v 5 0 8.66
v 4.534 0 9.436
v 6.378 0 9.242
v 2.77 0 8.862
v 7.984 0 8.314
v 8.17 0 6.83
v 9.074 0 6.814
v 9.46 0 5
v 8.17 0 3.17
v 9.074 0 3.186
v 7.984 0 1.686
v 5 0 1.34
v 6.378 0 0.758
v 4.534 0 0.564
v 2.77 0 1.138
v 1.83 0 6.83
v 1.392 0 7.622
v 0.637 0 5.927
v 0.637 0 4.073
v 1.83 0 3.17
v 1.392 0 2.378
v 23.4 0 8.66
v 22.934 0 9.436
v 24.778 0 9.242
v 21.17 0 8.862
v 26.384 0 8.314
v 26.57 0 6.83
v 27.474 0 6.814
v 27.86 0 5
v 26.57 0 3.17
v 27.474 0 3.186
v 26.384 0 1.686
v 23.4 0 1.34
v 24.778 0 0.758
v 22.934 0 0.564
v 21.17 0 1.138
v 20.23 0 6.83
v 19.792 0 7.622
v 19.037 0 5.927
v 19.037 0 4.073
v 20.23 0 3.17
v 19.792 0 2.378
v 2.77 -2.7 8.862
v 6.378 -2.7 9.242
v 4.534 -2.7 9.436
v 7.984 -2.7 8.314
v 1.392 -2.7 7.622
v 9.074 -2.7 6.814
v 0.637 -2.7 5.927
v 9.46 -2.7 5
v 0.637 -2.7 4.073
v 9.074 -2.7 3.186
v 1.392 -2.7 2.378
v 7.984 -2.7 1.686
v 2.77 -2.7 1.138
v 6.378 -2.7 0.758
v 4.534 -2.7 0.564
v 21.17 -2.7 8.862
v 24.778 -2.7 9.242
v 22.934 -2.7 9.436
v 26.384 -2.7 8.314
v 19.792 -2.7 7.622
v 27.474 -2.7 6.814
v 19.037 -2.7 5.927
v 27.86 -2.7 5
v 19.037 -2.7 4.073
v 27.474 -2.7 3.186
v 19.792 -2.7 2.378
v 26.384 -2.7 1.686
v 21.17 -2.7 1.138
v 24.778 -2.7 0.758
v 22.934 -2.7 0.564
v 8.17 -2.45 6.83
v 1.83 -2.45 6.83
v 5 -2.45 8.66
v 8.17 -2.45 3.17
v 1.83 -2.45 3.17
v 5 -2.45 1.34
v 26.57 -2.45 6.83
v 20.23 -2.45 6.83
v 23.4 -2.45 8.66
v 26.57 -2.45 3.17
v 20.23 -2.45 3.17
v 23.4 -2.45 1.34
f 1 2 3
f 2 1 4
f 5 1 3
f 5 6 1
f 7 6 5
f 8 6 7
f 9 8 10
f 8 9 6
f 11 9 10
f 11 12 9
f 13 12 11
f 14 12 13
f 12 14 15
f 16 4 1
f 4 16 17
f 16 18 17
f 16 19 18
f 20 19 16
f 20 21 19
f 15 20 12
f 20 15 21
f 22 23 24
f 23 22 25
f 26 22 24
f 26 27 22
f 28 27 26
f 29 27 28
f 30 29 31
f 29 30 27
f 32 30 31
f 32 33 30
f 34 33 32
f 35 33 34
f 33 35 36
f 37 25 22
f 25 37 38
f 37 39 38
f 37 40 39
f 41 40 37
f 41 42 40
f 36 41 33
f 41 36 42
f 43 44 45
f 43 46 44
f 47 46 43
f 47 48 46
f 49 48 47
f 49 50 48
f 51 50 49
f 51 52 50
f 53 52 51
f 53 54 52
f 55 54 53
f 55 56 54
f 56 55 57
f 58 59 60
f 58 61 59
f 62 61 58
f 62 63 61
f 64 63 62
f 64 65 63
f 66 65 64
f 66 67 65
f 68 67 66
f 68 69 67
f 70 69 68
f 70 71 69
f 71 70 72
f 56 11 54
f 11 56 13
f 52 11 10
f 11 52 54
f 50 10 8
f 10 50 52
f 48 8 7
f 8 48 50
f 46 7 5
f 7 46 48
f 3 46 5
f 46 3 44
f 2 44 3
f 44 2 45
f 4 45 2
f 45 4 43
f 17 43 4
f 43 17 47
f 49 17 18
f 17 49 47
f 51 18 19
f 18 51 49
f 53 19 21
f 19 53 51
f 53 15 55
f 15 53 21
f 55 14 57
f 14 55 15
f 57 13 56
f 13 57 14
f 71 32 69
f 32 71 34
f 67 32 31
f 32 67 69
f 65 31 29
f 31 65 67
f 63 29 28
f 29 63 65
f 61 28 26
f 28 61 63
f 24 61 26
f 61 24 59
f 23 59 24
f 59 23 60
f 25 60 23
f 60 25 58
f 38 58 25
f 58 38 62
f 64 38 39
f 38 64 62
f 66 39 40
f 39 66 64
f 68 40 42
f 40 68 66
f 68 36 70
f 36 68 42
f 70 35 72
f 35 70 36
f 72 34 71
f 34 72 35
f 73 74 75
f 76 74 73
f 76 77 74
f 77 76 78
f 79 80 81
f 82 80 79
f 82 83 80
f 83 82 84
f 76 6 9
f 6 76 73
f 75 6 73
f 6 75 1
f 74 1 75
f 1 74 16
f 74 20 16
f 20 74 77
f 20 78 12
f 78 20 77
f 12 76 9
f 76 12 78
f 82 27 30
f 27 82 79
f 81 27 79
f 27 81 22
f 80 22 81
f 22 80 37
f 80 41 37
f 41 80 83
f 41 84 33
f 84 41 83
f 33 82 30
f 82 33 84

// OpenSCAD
// Copyright (C) 2025 Arif K. Rafiq
// This program is free software: you can redistribute it and/or modify
// it under the terms of the GNU General Public License as published by
// the Free Software Foundation, either version 3 of the License, or
// (at your option) any later version.

// This program is distributed in the hope that it will be useful,
// but WITHOUT ANY WARRANTY; without even the implied warranty of
// MERCHANTABILITY or FITNESS FOR A PARTICULAR PURPOSE.  See the
// GNU General Public License for more details.

// You should have received a copy of the GNU General Public License
// along with this file.  If not, see <https://www.gnu.org/licenses/>,
// or write to: license@temperedoptimism.com



// Fixed in example3.scad
tFitGap = [0.16, 0.16, 0.16];   // New
tWallMin = [0.40, 0.40, 0.16];         
pHexSink = [3.5, 2.3];
vTerminal0 = [5.0, 5.0];
vTerminal1 = [23.4, 5.0];
fx0=2;    //convexity
tEps=0.01; // Fixing conflicting bodies

//28.32
// Rotate
rotate([90,0,0]){
  difference(){
    // hex pocket surround
    // Read about render(convexity)    
                               // Modified      
    linear_extrude(pHexSink.y+ tWallMin.y, convexity=fx0){  
                                                 // Modified
      translate(vTerminal0)  circle(pHexSink.x +(tWallMin.x *2) + tFitGap.x); //28:54
      translate(vTerminal1)  circle(pHexSink.x +(tWallMin.x *2) + tFitGap.x);
    }
    //hex pocket
    // Solve Conflicting bodies                       // Added tFitGap.y to 3 lines
    translate([0,0, -tEps]) linear_extrude(pHexSink.y + tFitGap.y, convexity=fx0){
      translate(vTerminal0)  rotate([0,0,30]) circle(pHexSink.x + tFitGap.y, $fn=6);
      translate(vTerminal1)  rotate([0,0,30]) circle(pHexSink.x + tFitGap.y, $fn=6);
    }
  }
}
